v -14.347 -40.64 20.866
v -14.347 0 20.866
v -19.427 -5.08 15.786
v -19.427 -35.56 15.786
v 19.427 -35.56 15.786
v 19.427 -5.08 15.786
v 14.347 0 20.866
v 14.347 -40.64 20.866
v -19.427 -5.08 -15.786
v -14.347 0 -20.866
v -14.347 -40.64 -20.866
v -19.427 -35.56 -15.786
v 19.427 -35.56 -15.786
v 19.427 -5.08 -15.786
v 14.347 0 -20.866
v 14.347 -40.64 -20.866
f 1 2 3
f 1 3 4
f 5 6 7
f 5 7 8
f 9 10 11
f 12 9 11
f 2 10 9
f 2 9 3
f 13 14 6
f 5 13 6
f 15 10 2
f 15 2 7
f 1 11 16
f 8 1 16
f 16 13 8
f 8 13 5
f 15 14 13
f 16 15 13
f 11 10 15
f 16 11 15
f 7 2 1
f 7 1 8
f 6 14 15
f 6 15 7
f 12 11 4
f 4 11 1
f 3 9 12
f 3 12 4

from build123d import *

# Parameters (mm, degrees)
F0_W     = 38.85378
F0_H     = 41.731834
F1_DEPTH = 40.64
F2_SIZE  = 5.08
F3_SIZE  = 5.08


with BuildPart() as f1:
    # F0 (on Front) → F1 (new body)
    with BuildSketch(Plane.XZ):
        Rectangle(F0_W, F0_H)
    extrude(amount=F1_DEPTH)

    # F2
    f2_edges = [f1.edges().sort_by_distance(p)[0] for p in [
        (-19.42689, -20.32, 20.865917),
        (-19.42689, -20.32, -20.865917),
        (-19.42689, 0, 0),
        (-19.42689, -40.64, 0),
    ]]
    chamfer(f2_edges, length=F2_SIZE)

    # F3
    f3_edges = [f1.edges().sort_by_distance(p)[0] for p in [
        (19.42689, -20.32, -20.865917),
        (19.42689, -20.32, 20.865917),
        (19.42689, 0, 0),
        (19.42689, -40.64, 0),
    ]]
    chamfer(f3_edges, length=F3_SIZE)


solid = f1.part
